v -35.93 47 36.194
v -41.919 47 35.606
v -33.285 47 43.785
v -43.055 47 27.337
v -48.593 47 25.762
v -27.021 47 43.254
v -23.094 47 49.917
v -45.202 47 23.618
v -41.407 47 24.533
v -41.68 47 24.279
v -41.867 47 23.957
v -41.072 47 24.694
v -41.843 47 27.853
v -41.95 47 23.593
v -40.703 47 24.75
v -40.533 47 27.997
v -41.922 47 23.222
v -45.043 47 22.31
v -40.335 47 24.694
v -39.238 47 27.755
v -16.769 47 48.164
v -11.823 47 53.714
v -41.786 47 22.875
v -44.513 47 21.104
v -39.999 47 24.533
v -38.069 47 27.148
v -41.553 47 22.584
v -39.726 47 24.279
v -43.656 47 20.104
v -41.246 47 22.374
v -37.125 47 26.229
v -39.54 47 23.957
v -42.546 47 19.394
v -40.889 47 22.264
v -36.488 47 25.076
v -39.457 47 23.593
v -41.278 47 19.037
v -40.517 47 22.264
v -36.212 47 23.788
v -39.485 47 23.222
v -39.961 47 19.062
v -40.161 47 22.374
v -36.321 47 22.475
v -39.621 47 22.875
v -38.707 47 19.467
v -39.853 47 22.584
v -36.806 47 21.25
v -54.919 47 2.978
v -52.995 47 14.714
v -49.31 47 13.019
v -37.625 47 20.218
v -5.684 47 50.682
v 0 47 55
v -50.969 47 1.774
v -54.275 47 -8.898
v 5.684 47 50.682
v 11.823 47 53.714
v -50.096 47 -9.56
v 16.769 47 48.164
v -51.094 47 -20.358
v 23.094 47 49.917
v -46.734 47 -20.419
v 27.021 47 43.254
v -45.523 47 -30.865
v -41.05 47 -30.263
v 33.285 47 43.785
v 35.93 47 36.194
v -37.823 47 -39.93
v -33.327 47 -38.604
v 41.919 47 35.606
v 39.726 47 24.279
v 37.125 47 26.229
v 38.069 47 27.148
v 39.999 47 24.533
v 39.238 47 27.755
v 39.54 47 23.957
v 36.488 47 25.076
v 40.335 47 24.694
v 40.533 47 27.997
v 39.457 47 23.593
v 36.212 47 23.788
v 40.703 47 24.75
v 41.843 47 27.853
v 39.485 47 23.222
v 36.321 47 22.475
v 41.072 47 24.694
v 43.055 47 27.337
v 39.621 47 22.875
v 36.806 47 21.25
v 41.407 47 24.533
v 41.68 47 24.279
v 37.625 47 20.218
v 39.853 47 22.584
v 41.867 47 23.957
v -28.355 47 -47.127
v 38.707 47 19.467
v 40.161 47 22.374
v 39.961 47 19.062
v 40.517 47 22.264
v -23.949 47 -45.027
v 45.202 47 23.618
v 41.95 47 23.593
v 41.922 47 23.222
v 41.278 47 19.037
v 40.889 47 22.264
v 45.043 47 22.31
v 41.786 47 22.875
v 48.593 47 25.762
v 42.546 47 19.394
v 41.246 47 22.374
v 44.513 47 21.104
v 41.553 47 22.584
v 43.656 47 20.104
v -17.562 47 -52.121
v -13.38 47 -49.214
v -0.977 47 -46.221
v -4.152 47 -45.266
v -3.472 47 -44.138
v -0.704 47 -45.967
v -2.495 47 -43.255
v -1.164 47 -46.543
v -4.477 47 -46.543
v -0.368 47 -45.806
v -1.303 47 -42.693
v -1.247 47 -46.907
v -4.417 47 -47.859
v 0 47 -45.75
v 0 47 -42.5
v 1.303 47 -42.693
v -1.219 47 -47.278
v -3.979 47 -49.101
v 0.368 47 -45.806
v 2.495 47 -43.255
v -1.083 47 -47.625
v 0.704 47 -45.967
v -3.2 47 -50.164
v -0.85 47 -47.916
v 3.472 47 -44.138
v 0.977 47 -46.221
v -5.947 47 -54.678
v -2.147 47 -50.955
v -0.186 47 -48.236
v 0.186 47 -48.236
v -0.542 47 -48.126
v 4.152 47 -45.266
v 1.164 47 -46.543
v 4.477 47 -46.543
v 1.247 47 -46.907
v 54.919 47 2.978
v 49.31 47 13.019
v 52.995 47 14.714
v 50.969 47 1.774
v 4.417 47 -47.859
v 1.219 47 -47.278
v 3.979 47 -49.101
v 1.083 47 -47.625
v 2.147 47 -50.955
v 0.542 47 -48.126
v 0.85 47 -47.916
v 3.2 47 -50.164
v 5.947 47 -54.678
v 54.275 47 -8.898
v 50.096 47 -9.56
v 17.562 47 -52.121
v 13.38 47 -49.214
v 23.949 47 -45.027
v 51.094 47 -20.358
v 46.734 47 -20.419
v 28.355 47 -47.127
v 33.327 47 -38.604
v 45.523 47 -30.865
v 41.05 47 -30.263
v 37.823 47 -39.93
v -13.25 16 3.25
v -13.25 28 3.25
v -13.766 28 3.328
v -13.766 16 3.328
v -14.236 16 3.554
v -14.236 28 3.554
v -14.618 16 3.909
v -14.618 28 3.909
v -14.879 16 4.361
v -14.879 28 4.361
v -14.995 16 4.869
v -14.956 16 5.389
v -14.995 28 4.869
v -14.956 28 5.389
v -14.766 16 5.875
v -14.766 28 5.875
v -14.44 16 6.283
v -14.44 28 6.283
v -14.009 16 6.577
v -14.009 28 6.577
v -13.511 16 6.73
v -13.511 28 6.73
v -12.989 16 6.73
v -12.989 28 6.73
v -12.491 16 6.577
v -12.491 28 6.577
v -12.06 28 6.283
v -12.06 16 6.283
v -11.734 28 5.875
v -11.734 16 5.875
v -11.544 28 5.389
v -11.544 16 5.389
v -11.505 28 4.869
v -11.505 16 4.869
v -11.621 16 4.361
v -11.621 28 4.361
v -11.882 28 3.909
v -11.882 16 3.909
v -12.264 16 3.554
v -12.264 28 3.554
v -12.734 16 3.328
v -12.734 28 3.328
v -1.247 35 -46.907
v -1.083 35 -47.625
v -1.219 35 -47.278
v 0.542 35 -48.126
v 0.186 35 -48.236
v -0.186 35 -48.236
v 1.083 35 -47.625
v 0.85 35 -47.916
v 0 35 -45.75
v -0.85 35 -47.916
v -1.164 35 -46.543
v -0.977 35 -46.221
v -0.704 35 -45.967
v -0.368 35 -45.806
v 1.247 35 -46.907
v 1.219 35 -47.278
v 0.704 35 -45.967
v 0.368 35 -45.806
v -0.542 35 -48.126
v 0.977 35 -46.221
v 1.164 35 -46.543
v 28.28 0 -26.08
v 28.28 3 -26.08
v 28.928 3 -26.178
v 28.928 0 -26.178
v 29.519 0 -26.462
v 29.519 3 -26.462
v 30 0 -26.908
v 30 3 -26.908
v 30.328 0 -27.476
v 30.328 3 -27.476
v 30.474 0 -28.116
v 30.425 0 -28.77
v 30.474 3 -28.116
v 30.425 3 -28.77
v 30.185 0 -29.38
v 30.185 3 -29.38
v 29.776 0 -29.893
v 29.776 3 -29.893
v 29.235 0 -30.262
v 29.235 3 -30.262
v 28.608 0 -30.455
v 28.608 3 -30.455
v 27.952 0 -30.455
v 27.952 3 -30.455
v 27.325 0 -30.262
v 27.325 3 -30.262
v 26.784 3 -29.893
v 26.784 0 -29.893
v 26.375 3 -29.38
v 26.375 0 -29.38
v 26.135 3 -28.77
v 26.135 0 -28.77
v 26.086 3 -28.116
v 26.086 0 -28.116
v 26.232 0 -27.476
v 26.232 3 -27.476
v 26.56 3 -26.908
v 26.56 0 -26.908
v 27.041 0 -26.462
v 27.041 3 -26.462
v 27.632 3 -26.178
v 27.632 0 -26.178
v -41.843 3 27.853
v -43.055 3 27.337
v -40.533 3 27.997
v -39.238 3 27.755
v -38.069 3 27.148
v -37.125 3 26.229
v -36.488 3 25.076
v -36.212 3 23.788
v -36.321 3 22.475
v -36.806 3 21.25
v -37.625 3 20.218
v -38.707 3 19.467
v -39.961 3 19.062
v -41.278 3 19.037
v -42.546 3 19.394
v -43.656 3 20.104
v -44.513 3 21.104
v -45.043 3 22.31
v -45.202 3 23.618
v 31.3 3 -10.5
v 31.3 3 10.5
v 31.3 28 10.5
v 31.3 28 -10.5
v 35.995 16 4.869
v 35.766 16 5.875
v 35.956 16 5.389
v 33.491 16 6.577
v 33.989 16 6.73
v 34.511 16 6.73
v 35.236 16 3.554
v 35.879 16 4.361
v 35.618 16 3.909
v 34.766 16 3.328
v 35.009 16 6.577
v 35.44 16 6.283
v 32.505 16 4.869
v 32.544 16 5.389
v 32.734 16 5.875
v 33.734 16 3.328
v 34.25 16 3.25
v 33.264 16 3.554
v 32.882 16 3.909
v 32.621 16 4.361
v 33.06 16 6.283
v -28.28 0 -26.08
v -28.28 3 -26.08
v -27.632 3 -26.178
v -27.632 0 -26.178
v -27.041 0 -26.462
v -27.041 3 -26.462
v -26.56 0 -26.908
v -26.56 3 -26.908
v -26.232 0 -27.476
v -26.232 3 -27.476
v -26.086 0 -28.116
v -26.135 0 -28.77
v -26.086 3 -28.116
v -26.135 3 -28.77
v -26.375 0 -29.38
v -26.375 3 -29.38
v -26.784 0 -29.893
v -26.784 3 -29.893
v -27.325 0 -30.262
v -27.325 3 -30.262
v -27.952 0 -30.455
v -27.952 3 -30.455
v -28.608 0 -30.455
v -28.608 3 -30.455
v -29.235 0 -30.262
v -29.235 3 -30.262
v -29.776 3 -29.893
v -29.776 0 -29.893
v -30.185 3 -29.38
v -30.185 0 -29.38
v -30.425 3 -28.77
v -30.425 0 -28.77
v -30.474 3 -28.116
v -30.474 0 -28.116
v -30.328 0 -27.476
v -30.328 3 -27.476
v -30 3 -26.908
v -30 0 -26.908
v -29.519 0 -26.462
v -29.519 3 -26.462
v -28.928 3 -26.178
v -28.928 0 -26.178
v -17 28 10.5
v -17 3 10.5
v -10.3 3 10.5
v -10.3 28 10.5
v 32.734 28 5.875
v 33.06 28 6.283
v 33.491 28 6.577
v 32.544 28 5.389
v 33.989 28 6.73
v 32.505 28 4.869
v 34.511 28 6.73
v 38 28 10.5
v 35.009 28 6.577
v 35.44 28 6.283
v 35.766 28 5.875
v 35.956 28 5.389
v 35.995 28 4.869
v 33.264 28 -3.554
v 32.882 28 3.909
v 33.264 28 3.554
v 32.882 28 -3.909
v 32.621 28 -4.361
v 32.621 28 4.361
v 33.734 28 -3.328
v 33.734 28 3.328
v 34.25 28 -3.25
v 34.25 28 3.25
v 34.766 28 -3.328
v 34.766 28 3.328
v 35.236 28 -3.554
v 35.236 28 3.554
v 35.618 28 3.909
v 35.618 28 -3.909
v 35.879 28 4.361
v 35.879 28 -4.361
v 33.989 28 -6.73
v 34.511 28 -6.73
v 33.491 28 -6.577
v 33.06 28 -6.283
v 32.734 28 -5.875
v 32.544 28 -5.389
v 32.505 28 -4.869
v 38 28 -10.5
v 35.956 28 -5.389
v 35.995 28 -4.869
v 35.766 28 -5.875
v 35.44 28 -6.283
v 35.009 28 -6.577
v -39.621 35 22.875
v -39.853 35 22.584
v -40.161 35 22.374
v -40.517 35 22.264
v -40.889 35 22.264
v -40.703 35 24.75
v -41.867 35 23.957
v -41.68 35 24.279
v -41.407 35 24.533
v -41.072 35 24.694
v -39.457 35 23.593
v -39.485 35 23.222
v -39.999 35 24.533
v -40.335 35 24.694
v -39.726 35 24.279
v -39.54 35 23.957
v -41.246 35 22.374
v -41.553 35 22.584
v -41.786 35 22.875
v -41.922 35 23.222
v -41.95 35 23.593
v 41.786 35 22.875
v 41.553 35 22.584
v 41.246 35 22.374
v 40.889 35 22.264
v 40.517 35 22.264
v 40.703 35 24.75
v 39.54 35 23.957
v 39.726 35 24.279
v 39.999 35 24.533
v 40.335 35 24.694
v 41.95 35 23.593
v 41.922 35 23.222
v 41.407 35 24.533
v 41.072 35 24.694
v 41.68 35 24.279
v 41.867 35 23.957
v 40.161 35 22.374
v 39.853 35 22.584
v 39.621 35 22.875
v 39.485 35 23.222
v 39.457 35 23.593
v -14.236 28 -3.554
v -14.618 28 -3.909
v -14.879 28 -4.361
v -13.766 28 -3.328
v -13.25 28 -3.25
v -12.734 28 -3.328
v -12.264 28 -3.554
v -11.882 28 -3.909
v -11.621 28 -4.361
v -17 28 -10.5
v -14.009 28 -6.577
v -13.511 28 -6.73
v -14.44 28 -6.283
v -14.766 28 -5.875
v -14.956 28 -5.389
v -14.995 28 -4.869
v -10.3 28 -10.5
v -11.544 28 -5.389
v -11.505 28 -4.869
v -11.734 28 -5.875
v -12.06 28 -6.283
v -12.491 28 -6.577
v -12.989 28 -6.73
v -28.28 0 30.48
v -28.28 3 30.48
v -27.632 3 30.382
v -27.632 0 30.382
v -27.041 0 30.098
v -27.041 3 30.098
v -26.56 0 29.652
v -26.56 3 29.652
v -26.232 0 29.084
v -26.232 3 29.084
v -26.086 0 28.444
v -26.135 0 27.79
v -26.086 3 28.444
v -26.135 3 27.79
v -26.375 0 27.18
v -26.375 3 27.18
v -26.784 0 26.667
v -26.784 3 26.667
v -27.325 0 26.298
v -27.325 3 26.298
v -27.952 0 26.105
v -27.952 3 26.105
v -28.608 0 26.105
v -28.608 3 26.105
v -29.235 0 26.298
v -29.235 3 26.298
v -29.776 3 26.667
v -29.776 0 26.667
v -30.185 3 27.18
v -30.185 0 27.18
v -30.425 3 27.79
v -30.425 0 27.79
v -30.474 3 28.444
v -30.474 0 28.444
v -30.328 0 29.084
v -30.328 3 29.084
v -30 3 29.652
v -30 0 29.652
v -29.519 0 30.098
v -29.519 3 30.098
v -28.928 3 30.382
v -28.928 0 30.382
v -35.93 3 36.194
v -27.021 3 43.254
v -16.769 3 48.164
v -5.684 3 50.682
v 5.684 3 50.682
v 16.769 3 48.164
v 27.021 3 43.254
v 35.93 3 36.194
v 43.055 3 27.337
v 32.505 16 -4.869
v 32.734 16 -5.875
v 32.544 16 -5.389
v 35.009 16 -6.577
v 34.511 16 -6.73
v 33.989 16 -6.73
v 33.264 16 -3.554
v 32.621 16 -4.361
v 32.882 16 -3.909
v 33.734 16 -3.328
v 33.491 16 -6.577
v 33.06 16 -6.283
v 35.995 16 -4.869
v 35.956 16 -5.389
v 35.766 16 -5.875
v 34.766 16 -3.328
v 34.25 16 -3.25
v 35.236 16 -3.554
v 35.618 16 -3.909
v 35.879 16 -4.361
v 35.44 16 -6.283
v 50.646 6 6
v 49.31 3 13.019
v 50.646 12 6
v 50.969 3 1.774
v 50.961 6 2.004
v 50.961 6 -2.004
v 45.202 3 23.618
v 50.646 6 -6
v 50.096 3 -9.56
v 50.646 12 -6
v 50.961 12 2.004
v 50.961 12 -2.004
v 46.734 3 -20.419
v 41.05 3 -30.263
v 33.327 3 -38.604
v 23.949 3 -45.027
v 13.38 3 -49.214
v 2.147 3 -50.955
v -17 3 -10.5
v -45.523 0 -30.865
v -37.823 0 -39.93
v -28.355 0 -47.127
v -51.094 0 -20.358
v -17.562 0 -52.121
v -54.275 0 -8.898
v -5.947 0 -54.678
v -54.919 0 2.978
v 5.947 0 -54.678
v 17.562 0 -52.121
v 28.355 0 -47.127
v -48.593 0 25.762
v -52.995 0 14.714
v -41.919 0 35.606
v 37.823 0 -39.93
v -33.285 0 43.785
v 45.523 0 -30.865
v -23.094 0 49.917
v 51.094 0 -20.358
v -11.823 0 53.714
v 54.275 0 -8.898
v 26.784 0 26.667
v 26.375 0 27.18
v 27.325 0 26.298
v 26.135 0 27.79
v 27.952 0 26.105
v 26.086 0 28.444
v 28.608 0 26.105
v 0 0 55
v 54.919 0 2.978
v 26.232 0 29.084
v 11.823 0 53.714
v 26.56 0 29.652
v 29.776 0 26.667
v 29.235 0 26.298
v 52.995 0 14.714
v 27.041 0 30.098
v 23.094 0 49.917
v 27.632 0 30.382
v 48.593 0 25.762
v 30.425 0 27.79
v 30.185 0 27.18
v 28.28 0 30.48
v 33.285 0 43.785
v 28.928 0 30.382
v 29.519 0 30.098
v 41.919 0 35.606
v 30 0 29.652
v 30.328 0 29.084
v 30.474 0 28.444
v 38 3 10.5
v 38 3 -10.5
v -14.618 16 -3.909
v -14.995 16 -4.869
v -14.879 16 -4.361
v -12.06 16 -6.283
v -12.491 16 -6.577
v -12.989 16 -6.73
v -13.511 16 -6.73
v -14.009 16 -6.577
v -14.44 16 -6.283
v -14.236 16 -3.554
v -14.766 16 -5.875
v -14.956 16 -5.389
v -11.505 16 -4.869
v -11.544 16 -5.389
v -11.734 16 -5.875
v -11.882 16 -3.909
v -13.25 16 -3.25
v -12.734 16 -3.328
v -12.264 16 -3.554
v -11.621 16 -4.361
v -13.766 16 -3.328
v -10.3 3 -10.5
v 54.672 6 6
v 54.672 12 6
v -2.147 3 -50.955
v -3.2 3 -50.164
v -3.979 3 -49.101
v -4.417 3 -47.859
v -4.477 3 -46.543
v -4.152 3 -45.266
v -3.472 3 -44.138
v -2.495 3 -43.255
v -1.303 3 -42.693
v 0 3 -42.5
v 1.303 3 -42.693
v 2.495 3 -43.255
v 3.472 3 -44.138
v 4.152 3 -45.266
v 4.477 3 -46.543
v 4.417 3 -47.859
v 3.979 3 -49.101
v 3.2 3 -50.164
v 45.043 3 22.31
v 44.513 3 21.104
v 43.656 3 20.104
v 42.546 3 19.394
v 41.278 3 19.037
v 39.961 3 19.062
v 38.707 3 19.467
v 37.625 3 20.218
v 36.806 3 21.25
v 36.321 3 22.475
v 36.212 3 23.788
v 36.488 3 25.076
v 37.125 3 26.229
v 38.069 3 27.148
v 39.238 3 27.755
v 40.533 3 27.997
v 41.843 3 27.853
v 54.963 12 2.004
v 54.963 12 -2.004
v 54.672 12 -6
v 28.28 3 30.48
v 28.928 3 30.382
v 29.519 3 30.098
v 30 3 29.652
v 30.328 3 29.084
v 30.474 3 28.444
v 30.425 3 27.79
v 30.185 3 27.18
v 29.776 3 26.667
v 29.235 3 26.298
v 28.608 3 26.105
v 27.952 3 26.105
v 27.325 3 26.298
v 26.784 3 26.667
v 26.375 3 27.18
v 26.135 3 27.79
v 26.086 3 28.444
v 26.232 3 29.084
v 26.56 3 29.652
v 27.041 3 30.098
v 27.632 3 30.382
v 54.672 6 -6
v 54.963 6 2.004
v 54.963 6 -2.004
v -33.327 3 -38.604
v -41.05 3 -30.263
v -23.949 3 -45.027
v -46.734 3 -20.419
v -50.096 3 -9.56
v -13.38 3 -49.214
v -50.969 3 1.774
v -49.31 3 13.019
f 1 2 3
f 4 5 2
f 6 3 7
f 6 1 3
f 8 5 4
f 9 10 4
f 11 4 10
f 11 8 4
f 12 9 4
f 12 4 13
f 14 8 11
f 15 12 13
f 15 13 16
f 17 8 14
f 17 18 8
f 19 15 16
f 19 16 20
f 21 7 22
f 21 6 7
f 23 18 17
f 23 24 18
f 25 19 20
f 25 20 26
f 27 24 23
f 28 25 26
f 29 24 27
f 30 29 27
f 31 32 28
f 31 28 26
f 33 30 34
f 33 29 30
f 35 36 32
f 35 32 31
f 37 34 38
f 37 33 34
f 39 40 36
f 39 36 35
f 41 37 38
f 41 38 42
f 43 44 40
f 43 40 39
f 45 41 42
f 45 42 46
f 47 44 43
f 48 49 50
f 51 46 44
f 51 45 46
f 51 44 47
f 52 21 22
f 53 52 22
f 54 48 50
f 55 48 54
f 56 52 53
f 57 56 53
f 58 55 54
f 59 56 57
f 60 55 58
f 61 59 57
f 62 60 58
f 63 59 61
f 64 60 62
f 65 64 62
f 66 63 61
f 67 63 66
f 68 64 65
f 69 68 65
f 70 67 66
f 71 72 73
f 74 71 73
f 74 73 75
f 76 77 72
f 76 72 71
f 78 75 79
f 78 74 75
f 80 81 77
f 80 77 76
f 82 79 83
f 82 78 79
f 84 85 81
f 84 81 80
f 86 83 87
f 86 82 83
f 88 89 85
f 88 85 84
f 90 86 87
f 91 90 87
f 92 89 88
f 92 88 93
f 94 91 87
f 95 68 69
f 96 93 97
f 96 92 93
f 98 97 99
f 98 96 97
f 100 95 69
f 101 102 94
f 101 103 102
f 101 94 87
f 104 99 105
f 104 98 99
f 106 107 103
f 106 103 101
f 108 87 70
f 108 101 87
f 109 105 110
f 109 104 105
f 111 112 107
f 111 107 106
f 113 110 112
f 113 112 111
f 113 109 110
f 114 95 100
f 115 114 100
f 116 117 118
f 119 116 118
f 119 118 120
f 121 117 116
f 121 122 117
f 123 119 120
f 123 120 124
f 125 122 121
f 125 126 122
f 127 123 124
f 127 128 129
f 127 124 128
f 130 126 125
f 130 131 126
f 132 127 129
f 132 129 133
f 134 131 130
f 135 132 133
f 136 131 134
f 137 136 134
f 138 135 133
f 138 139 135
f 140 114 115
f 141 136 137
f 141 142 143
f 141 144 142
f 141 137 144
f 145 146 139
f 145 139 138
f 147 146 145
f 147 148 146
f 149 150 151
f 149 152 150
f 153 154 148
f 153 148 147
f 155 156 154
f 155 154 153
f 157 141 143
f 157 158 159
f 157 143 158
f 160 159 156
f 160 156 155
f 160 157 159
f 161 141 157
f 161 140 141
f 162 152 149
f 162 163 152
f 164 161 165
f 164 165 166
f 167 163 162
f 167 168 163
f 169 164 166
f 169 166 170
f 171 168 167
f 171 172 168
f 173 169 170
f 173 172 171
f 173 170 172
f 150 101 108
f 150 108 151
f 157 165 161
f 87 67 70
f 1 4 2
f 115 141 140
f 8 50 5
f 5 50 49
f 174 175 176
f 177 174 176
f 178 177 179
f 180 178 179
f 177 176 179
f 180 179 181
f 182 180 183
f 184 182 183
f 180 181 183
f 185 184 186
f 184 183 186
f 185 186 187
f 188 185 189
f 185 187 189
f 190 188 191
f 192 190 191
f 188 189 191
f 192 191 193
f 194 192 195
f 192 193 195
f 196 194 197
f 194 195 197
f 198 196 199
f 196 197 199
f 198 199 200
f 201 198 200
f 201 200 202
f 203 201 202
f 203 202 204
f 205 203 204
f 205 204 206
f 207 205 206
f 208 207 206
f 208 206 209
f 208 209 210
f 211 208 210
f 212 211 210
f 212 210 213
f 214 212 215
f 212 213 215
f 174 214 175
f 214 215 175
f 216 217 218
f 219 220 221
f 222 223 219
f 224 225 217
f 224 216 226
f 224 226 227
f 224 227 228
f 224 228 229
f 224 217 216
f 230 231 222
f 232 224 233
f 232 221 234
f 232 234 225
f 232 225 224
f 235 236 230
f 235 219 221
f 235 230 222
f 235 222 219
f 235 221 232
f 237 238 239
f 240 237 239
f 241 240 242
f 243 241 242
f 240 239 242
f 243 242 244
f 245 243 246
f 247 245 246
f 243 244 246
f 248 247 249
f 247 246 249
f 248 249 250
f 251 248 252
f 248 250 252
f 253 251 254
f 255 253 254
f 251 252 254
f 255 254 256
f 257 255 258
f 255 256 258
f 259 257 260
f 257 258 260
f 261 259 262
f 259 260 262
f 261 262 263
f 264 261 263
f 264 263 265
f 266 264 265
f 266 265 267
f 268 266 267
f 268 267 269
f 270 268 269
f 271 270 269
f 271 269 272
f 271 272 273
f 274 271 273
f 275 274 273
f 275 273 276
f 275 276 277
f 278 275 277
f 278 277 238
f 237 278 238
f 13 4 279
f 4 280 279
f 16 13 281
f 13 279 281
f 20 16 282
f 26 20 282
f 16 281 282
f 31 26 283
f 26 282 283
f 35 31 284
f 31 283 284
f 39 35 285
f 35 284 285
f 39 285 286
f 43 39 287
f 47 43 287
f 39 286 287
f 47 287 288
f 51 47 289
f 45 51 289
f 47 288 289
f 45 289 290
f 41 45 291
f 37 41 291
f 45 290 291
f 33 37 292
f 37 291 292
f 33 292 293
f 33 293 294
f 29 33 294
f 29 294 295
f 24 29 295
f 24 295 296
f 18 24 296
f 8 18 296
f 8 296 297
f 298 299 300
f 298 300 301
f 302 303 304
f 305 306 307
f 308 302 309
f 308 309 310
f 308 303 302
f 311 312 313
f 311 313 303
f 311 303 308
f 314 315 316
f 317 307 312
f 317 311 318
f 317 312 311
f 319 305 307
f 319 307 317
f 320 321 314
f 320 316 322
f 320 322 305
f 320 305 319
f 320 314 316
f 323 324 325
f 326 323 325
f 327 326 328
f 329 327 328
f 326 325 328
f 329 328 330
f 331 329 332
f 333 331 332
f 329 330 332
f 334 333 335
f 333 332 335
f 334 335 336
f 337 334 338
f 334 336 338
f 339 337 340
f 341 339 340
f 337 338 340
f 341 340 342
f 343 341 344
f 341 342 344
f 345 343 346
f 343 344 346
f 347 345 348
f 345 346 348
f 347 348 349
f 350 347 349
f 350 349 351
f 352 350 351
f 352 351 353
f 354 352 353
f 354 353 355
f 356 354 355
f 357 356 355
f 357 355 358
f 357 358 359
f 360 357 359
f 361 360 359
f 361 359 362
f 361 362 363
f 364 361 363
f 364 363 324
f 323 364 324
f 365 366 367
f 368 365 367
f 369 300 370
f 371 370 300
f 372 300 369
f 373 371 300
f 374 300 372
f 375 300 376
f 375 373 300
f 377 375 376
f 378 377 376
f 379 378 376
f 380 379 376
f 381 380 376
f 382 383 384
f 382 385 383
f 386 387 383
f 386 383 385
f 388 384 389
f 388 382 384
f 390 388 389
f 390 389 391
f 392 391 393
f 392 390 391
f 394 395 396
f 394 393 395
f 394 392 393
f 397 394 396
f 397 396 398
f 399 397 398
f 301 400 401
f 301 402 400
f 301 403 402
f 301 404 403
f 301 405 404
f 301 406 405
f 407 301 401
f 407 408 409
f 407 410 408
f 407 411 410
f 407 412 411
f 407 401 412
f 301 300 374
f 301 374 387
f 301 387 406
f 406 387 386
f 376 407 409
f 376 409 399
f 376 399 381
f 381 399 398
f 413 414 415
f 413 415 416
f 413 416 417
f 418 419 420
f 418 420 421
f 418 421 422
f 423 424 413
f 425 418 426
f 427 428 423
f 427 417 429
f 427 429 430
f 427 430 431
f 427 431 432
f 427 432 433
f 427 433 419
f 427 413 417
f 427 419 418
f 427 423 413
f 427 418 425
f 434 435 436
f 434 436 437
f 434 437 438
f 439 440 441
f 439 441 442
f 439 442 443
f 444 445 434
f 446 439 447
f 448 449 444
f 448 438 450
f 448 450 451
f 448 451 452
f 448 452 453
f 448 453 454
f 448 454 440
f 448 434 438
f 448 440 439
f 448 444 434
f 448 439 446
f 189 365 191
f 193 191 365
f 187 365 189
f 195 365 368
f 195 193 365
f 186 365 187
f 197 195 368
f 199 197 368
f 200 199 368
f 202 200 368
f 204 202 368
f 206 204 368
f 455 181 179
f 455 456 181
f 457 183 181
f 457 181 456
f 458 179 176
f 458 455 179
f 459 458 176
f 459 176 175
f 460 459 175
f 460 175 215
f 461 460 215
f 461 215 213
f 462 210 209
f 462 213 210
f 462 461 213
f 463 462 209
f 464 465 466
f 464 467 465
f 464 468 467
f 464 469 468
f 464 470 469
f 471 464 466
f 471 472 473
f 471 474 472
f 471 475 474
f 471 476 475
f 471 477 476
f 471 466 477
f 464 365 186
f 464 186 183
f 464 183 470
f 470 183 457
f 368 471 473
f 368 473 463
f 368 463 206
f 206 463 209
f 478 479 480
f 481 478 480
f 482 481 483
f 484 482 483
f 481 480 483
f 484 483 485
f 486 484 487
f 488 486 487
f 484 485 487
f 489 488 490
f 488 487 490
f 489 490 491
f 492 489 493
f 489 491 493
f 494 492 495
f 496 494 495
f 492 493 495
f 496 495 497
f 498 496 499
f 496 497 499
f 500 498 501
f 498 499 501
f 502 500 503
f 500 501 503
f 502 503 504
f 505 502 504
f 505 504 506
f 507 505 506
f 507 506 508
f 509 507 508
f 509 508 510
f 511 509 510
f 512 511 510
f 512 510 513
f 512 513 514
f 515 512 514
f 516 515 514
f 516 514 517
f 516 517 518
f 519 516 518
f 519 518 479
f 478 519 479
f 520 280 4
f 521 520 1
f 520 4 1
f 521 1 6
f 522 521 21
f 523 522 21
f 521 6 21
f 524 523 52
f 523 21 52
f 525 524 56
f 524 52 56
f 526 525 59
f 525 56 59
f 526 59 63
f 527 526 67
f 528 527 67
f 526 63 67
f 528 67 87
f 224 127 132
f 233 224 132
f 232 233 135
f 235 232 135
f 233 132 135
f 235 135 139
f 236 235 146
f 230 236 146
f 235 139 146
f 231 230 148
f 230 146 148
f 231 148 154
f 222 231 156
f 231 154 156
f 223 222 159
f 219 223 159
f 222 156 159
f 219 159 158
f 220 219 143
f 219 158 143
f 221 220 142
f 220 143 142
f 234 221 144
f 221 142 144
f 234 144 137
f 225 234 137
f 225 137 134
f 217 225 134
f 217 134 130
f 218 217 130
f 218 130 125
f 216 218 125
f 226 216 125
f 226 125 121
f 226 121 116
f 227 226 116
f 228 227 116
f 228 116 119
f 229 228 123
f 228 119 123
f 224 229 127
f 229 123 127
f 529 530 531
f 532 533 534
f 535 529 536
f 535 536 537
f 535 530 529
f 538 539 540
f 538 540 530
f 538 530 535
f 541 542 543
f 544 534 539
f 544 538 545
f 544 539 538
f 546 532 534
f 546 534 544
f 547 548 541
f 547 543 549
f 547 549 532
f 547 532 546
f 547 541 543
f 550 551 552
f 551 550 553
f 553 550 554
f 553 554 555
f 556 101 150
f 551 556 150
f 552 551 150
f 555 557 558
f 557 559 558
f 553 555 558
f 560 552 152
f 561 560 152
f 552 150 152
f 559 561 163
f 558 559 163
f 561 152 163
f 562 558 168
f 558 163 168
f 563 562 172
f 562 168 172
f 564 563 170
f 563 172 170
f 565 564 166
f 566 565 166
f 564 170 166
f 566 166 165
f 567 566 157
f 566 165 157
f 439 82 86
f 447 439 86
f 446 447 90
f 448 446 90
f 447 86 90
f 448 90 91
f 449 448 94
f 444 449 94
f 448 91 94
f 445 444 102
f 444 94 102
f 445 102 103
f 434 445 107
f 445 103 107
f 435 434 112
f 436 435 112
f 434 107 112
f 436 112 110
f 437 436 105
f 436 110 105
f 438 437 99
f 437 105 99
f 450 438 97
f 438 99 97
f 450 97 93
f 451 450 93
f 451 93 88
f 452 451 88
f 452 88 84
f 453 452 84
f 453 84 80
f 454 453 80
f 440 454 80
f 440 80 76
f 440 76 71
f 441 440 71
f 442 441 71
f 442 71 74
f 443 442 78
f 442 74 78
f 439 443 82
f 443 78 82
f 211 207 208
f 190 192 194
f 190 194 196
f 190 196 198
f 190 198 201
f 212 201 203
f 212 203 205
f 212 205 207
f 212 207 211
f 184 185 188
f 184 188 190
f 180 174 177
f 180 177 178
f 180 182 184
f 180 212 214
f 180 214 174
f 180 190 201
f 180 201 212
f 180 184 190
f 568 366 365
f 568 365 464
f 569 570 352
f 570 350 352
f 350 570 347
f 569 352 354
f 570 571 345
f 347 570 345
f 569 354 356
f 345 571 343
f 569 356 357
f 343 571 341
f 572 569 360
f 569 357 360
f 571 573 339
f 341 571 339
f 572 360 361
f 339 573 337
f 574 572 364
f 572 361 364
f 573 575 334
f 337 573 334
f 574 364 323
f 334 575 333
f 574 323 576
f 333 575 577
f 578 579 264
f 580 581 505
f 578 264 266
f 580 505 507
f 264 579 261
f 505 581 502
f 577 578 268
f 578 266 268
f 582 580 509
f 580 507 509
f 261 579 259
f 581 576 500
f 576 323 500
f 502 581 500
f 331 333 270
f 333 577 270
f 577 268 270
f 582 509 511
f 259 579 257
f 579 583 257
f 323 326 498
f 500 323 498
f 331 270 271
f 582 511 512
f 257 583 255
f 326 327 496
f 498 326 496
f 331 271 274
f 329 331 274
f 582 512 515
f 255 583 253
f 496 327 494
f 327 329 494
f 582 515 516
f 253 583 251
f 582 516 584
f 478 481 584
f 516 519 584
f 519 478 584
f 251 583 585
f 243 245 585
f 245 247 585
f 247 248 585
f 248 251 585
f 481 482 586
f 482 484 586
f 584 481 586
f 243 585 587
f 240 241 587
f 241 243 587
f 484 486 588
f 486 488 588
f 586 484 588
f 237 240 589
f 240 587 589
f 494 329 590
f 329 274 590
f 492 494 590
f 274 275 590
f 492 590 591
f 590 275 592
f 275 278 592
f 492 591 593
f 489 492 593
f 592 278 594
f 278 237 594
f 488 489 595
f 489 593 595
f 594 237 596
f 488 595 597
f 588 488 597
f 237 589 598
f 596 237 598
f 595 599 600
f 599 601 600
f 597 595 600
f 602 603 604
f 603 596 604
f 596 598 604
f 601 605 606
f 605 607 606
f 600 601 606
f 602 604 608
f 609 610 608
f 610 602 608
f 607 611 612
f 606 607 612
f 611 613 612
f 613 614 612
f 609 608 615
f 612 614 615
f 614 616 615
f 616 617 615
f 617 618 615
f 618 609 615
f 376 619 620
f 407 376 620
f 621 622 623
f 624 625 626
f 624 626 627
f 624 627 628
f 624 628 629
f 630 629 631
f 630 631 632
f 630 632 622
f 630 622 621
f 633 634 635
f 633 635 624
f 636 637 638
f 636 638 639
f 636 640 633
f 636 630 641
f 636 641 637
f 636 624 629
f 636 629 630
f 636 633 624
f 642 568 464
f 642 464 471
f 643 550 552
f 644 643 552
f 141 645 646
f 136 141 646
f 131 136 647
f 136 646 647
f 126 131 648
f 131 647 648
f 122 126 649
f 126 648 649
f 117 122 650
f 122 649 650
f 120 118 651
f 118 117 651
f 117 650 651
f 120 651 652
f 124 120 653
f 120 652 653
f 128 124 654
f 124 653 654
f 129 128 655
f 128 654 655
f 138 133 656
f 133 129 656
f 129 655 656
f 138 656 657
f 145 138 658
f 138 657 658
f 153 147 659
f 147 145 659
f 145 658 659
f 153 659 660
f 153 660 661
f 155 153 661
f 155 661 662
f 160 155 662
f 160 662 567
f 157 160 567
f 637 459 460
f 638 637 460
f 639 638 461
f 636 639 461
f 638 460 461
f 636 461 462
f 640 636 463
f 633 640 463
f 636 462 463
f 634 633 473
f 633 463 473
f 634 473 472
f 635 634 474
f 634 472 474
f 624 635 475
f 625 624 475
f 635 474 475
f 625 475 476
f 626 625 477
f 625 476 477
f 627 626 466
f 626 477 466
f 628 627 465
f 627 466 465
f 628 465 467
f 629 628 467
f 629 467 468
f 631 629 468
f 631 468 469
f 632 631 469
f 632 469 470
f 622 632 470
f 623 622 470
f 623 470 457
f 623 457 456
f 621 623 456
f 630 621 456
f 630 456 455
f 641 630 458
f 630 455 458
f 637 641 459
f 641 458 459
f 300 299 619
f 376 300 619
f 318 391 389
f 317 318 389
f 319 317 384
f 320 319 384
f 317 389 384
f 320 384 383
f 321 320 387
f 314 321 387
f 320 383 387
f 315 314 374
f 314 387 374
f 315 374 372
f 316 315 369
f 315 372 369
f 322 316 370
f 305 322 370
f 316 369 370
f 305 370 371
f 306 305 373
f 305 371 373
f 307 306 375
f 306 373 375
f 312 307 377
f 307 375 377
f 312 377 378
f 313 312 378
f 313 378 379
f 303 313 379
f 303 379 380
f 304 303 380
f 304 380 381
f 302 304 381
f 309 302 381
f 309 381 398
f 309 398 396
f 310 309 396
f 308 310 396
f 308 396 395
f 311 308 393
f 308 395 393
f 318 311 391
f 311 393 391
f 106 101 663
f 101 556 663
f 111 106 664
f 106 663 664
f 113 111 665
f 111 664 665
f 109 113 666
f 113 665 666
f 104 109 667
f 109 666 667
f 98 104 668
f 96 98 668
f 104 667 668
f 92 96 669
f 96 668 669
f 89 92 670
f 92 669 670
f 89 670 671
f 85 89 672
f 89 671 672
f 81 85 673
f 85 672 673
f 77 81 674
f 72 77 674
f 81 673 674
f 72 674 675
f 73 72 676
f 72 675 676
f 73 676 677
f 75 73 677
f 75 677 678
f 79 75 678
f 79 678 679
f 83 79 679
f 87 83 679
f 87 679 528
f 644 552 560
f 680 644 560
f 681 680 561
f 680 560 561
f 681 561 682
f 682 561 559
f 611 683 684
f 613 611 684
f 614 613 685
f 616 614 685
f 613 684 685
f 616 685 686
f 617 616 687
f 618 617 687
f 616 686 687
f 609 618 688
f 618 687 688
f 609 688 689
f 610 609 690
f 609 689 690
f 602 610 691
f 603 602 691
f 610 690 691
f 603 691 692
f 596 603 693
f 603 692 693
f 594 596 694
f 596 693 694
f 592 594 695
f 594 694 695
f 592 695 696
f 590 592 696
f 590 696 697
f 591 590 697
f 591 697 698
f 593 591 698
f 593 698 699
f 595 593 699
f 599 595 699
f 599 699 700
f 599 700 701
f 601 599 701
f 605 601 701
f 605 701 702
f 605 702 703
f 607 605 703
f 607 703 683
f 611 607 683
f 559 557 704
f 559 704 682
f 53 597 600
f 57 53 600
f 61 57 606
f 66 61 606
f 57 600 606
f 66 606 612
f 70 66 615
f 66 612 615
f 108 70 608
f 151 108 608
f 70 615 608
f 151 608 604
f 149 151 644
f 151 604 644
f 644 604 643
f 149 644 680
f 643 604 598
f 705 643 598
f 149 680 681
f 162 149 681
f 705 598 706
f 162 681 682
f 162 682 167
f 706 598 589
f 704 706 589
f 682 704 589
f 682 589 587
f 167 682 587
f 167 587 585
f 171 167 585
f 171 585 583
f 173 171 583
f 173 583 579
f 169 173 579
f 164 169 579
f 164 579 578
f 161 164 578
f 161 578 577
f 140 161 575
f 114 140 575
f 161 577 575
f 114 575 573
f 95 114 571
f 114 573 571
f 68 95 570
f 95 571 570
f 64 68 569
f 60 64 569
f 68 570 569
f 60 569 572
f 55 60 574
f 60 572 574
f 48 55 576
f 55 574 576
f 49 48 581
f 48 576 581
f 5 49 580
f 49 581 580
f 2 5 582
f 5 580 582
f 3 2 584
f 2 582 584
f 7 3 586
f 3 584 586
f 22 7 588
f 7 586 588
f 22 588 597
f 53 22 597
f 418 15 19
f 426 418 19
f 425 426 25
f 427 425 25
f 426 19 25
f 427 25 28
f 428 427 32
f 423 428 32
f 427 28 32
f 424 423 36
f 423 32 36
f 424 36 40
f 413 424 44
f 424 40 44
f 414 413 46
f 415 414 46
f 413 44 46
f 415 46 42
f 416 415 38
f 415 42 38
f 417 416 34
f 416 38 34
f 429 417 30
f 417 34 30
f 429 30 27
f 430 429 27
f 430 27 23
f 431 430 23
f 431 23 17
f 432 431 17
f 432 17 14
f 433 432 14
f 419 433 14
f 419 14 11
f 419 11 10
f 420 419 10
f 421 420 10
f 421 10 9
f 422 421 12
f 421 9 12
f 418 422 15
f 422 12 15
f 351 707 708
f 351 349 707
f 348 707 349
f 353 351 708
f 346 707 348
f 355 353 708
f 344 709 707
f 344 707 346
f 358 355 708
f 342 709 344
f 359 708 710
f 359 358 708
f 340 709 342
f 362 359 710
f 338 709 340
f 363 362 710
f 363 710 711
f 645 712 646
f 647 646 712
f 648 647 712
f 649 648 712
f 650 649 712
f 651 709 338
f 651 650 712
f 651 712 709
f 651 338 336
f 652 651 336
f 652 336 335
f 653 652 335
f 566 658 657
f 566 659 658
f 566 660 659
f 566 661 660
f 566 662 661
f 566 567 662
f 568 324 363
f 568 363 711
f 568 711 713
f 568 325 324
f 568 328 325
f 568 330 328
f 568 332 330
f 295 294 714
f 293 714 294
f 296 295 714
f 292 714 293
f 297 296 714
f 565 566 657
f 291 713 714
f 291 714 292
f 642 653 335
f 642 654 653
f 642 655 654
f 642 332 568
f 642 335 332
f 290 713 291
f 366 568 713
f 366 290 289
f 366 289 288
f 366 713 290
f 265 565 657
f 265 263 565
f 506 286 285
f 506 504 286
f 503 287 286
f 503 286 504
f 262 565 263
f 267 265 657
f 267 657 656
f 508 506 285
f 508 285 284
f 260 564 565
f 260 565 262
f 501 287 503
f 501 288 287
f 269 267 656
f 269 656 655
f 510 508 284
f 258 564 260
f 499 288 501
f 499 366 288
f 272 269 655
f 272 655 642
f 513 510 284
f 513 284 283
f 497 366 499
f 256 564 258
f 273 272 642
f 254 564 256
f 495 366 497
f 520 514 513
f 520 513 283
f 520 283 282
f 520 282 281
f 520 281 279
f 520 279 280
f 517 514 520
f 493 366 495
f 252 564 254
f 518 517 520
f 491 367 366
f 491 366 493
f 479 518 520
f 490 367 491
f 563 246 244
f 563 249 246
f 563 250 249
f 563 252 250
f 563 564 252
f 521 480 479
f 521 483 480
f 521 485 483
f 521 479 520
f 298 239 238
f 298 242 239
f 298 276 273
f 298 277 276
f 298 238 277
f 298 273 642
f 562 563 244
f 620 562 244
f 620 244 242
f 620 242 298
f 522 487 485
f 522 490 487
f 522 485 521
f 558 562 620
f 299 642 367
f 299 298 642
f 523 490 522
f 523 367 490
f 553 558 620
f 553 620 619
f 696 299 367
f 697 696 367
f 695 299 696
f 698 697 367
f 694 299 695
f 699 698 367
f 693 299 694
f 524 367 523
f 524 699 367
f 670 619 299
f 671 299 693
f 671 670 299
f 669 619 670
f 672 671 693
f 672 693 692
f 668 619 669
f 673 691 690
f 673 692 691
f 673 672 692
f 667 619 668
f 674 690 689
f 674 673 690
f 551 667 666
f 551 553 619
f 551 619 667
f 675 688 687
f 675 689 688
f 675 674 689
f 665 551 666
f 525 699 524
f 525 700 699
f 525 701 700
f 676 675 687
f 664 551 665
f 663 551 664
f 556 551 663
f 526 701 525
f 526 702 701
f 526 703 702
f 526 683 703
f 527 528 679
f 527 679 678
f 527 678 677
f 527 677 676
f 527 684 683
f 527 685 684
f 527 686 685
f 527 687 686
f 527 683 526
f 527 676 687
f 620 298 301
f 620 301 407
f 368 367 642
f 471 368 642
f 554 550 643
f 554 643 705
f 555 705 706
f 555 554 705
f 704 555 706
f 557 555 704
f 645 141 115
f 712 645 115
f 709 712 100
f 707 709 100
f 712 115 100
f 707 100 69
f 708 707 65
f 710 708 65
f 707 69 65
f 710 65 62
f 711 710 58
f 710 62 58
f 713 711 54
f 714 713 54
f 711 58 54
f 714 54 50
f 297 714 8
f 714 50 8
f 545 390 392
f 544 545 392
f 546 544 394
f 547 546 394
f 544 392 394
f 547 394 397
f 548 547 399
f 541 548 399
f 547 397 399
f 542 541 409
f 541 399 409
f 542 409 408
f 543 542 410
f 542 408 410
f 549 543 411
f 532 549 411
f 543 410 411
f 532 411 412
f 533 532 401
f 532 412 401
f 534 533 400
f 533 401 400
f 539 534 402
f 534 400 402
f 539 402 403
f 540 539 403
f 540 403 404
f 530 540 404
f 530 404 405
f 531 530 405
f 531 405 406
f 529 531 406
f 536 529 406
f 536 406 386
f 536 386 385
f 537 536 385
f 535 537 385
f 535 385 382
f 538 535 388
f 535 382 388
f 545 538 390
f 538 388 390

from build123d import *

# Parameters (mm, degrees)
SCHIZZO1_R                   = 55
ESTRUSIONE_ESTRUSIONE1_DEPTH = 47
SCHIZZO2_R                   = 51
TAGLIO_ESTRUSIONE1_DEPTH     = 44
SCHIZZO3_W                   = 6.7
SCHIZZO3_H                   = 21
ESTRUSIONE_ESTRUSIONE2_DEPTH = 25
SCHIZZO9_R                   = 1.75
TAGLIO_ESTRUSIONE2_DEPTH     = 12
TAGLIO_ESTRUSIONE3_START     = 45
SCHIZZO10_W                  = 12
SCHIZZO10_H                  = 6
TAGLIO_ESTRUSIONE3_DEPTH     = 67
SCHIZZO12_R                  = 2.2
TAGLIO_ESTRUSIONE4_DEPTH     = 90.364422451
SCHIZZO13_R                  = 4.5
ESTRUSIONE_ESTRUSIONE4_DEPTH = 44
SCHIZZO14_R                  = 1.25
TAGLIO_ESTRUSIONE6_DEPTH     = 12


with BuildPart() as part:
    # Schizzo1 → Estrusione-Estrusione1 (new body)
    with BuildSketch(Plane(origin=(0, 0, 0), x_dir=(1, 0, 0), z_dir=(0, 1, 0))):
        with Locations(Location((0, 0, 0), (0, 0, 270))):
            Circle(SCHIZZO1_R)
    extrude(amount=ESTRUSIONE_ESTRUSIONE1_DEPTH)

    # Schizzo2 → Taglio-Estrusione1 (cut)
    with BuildSketch(Plane(origin=(0, 47, 0), x_dir=(1, 0, 0), z_dir=(0, 1, 0))):
        with Locations(Location((0, 0, 0), (0, 0, 270))):
            Circle(SCHIZZO2_R)
    extrude(amount=-TAGLIO_ESTRUSIONE1_DEPTH, mode=Mode.SUBTRACT)

    # Schizzo3 → Estrusione-Estrusione2 (add)
    with BuildSketch(Plane(origin=(0, 3, 0), x_dir=(1, 0, 0), z_dir=(0, 1, 0))):
        with Locations((-13.65, 0)):
            Rectangle(SCHIZZO3_W, SCHIZZO3_H)
        with Locations((34.65, 0)):
            Rectangle(SCHIZZO3_W, SCHIZZO3_H)
    extrude(amount=ESTRUSIONE_ESTRUSIONE2_DEPTH)

    # Schizzo9 → Taglio-Estrusione2 (cut)
    with BuildSketch(Plane(origin=(0, 28, 0), x_dir=(1, 0, 0), z_dir=(0, 1, 0))):
        with Locations(Location((-13.25, 5, 0), (0, 0, 270))):
            Circle(SCHIZZO9_R)
        with Locations(Location((-13.25, -5, 0), (0, 0, 90))):
            Circle(SCHIZZO9_R)
        with Locations(Location((34.25, 5, 0), (0, 0, 270))):
            Circle(SCHIZZO9_R)
        with Locations(Location((34.25, -5, 0), (0, 0, 90))):
            Circle(SCHIZZO9_R)
    extrude(amount=-TAGLIO_ESTRUSIONE2_DEPTH, mode=Mode.SUBTRACT)

    # Schizzo10 → Taglio-Estrusione3 (cut)
    with BuildSketch(Plane(origin=(0, 0, 0), x_dir=(0, 0, -1), z_dir=(1, 0, 0)).offset(TAGLIO_ESTRUSIONE3_START)):
        with Locations((0, 9)):
            Rectangle(SCHIZZO10_W, SCHIZZO10_H)
    extrude(amount=TAGLIO_ESTRUSIONE3_DEPTH, mode=Mode.SUBTRACT)

    # Schizzo12 → Taglio-Estrusione4 (cut, through all)
    with BuildSketch(Plane(origin=(0, 3, 0), x_dir=(1, 0, 0), z_dir=(0, 1, 0))):
        with Locations(Location((-28.28, 28.28, 0), (0, 0, 270))):
            Circle(SCHIZZO12_R)
        with Locations(Location((28.28, 28.28, 0), (0, 0, 270))):
            Circle(SCHIZZO12_R)
        with Locations(Location((28.28, -28.28, 0), (0, 0, 270))):
            Circle(SCHIZZO12_R)
        with Locations(Location((-28.28, -28.28, 0), (0, 0, 270))):
            Circle(SCHIZZO12_R)
    extrude(amount=-TAGLIO_ESTRUSIONE4_DEPTH, mode=Mode.SUBTRACT)

    # Schizzo13 → Estrusione-Estrusione4 (add)
    with BuildSketch(Plane(origin=(0, 3, 0), x_dir=(1, 0, 0), z_dir=(0, 1, 0))):
        with Locations((0, 47)):
            Circle(SCHIZZO13_R)
        with Locations((40.703193978, -23.5)):
            Circle(SCHIZZO13_R)
        with Locations((-40.703193978, -23.5)):
            Circle(SCHIZZO13_R)
    extrude(amount=ESTRUSIONE_ESTRUSIONE4_DEPTH)

    # Schizzo14 → Taglio-Estrusione6 (cut)
    with BuildSketch(Plane(origin=(0, 47, 0), x_dir=(1, 0, 0), z_dir=(0, 1, 0))):
        with Locations(Location((0, 47, 0), (0, 0, 270))):
            Circle(SCHIZZO14_R)
        with Locations(Location((40.703193978, -23.5, 0), (0, 0, 270))):
            Circle(SCHIZZO14_R)
        with Locations(Location((-40.703193978, -23.5, 0), (0, 0, 270))):
            Circle(SCHIZZO14_R)
    extrude(amount=-TAGLIO_ESTRUSIONE6_DEPTH, mode=Mode.SUBTRACT)


solid = part.part
